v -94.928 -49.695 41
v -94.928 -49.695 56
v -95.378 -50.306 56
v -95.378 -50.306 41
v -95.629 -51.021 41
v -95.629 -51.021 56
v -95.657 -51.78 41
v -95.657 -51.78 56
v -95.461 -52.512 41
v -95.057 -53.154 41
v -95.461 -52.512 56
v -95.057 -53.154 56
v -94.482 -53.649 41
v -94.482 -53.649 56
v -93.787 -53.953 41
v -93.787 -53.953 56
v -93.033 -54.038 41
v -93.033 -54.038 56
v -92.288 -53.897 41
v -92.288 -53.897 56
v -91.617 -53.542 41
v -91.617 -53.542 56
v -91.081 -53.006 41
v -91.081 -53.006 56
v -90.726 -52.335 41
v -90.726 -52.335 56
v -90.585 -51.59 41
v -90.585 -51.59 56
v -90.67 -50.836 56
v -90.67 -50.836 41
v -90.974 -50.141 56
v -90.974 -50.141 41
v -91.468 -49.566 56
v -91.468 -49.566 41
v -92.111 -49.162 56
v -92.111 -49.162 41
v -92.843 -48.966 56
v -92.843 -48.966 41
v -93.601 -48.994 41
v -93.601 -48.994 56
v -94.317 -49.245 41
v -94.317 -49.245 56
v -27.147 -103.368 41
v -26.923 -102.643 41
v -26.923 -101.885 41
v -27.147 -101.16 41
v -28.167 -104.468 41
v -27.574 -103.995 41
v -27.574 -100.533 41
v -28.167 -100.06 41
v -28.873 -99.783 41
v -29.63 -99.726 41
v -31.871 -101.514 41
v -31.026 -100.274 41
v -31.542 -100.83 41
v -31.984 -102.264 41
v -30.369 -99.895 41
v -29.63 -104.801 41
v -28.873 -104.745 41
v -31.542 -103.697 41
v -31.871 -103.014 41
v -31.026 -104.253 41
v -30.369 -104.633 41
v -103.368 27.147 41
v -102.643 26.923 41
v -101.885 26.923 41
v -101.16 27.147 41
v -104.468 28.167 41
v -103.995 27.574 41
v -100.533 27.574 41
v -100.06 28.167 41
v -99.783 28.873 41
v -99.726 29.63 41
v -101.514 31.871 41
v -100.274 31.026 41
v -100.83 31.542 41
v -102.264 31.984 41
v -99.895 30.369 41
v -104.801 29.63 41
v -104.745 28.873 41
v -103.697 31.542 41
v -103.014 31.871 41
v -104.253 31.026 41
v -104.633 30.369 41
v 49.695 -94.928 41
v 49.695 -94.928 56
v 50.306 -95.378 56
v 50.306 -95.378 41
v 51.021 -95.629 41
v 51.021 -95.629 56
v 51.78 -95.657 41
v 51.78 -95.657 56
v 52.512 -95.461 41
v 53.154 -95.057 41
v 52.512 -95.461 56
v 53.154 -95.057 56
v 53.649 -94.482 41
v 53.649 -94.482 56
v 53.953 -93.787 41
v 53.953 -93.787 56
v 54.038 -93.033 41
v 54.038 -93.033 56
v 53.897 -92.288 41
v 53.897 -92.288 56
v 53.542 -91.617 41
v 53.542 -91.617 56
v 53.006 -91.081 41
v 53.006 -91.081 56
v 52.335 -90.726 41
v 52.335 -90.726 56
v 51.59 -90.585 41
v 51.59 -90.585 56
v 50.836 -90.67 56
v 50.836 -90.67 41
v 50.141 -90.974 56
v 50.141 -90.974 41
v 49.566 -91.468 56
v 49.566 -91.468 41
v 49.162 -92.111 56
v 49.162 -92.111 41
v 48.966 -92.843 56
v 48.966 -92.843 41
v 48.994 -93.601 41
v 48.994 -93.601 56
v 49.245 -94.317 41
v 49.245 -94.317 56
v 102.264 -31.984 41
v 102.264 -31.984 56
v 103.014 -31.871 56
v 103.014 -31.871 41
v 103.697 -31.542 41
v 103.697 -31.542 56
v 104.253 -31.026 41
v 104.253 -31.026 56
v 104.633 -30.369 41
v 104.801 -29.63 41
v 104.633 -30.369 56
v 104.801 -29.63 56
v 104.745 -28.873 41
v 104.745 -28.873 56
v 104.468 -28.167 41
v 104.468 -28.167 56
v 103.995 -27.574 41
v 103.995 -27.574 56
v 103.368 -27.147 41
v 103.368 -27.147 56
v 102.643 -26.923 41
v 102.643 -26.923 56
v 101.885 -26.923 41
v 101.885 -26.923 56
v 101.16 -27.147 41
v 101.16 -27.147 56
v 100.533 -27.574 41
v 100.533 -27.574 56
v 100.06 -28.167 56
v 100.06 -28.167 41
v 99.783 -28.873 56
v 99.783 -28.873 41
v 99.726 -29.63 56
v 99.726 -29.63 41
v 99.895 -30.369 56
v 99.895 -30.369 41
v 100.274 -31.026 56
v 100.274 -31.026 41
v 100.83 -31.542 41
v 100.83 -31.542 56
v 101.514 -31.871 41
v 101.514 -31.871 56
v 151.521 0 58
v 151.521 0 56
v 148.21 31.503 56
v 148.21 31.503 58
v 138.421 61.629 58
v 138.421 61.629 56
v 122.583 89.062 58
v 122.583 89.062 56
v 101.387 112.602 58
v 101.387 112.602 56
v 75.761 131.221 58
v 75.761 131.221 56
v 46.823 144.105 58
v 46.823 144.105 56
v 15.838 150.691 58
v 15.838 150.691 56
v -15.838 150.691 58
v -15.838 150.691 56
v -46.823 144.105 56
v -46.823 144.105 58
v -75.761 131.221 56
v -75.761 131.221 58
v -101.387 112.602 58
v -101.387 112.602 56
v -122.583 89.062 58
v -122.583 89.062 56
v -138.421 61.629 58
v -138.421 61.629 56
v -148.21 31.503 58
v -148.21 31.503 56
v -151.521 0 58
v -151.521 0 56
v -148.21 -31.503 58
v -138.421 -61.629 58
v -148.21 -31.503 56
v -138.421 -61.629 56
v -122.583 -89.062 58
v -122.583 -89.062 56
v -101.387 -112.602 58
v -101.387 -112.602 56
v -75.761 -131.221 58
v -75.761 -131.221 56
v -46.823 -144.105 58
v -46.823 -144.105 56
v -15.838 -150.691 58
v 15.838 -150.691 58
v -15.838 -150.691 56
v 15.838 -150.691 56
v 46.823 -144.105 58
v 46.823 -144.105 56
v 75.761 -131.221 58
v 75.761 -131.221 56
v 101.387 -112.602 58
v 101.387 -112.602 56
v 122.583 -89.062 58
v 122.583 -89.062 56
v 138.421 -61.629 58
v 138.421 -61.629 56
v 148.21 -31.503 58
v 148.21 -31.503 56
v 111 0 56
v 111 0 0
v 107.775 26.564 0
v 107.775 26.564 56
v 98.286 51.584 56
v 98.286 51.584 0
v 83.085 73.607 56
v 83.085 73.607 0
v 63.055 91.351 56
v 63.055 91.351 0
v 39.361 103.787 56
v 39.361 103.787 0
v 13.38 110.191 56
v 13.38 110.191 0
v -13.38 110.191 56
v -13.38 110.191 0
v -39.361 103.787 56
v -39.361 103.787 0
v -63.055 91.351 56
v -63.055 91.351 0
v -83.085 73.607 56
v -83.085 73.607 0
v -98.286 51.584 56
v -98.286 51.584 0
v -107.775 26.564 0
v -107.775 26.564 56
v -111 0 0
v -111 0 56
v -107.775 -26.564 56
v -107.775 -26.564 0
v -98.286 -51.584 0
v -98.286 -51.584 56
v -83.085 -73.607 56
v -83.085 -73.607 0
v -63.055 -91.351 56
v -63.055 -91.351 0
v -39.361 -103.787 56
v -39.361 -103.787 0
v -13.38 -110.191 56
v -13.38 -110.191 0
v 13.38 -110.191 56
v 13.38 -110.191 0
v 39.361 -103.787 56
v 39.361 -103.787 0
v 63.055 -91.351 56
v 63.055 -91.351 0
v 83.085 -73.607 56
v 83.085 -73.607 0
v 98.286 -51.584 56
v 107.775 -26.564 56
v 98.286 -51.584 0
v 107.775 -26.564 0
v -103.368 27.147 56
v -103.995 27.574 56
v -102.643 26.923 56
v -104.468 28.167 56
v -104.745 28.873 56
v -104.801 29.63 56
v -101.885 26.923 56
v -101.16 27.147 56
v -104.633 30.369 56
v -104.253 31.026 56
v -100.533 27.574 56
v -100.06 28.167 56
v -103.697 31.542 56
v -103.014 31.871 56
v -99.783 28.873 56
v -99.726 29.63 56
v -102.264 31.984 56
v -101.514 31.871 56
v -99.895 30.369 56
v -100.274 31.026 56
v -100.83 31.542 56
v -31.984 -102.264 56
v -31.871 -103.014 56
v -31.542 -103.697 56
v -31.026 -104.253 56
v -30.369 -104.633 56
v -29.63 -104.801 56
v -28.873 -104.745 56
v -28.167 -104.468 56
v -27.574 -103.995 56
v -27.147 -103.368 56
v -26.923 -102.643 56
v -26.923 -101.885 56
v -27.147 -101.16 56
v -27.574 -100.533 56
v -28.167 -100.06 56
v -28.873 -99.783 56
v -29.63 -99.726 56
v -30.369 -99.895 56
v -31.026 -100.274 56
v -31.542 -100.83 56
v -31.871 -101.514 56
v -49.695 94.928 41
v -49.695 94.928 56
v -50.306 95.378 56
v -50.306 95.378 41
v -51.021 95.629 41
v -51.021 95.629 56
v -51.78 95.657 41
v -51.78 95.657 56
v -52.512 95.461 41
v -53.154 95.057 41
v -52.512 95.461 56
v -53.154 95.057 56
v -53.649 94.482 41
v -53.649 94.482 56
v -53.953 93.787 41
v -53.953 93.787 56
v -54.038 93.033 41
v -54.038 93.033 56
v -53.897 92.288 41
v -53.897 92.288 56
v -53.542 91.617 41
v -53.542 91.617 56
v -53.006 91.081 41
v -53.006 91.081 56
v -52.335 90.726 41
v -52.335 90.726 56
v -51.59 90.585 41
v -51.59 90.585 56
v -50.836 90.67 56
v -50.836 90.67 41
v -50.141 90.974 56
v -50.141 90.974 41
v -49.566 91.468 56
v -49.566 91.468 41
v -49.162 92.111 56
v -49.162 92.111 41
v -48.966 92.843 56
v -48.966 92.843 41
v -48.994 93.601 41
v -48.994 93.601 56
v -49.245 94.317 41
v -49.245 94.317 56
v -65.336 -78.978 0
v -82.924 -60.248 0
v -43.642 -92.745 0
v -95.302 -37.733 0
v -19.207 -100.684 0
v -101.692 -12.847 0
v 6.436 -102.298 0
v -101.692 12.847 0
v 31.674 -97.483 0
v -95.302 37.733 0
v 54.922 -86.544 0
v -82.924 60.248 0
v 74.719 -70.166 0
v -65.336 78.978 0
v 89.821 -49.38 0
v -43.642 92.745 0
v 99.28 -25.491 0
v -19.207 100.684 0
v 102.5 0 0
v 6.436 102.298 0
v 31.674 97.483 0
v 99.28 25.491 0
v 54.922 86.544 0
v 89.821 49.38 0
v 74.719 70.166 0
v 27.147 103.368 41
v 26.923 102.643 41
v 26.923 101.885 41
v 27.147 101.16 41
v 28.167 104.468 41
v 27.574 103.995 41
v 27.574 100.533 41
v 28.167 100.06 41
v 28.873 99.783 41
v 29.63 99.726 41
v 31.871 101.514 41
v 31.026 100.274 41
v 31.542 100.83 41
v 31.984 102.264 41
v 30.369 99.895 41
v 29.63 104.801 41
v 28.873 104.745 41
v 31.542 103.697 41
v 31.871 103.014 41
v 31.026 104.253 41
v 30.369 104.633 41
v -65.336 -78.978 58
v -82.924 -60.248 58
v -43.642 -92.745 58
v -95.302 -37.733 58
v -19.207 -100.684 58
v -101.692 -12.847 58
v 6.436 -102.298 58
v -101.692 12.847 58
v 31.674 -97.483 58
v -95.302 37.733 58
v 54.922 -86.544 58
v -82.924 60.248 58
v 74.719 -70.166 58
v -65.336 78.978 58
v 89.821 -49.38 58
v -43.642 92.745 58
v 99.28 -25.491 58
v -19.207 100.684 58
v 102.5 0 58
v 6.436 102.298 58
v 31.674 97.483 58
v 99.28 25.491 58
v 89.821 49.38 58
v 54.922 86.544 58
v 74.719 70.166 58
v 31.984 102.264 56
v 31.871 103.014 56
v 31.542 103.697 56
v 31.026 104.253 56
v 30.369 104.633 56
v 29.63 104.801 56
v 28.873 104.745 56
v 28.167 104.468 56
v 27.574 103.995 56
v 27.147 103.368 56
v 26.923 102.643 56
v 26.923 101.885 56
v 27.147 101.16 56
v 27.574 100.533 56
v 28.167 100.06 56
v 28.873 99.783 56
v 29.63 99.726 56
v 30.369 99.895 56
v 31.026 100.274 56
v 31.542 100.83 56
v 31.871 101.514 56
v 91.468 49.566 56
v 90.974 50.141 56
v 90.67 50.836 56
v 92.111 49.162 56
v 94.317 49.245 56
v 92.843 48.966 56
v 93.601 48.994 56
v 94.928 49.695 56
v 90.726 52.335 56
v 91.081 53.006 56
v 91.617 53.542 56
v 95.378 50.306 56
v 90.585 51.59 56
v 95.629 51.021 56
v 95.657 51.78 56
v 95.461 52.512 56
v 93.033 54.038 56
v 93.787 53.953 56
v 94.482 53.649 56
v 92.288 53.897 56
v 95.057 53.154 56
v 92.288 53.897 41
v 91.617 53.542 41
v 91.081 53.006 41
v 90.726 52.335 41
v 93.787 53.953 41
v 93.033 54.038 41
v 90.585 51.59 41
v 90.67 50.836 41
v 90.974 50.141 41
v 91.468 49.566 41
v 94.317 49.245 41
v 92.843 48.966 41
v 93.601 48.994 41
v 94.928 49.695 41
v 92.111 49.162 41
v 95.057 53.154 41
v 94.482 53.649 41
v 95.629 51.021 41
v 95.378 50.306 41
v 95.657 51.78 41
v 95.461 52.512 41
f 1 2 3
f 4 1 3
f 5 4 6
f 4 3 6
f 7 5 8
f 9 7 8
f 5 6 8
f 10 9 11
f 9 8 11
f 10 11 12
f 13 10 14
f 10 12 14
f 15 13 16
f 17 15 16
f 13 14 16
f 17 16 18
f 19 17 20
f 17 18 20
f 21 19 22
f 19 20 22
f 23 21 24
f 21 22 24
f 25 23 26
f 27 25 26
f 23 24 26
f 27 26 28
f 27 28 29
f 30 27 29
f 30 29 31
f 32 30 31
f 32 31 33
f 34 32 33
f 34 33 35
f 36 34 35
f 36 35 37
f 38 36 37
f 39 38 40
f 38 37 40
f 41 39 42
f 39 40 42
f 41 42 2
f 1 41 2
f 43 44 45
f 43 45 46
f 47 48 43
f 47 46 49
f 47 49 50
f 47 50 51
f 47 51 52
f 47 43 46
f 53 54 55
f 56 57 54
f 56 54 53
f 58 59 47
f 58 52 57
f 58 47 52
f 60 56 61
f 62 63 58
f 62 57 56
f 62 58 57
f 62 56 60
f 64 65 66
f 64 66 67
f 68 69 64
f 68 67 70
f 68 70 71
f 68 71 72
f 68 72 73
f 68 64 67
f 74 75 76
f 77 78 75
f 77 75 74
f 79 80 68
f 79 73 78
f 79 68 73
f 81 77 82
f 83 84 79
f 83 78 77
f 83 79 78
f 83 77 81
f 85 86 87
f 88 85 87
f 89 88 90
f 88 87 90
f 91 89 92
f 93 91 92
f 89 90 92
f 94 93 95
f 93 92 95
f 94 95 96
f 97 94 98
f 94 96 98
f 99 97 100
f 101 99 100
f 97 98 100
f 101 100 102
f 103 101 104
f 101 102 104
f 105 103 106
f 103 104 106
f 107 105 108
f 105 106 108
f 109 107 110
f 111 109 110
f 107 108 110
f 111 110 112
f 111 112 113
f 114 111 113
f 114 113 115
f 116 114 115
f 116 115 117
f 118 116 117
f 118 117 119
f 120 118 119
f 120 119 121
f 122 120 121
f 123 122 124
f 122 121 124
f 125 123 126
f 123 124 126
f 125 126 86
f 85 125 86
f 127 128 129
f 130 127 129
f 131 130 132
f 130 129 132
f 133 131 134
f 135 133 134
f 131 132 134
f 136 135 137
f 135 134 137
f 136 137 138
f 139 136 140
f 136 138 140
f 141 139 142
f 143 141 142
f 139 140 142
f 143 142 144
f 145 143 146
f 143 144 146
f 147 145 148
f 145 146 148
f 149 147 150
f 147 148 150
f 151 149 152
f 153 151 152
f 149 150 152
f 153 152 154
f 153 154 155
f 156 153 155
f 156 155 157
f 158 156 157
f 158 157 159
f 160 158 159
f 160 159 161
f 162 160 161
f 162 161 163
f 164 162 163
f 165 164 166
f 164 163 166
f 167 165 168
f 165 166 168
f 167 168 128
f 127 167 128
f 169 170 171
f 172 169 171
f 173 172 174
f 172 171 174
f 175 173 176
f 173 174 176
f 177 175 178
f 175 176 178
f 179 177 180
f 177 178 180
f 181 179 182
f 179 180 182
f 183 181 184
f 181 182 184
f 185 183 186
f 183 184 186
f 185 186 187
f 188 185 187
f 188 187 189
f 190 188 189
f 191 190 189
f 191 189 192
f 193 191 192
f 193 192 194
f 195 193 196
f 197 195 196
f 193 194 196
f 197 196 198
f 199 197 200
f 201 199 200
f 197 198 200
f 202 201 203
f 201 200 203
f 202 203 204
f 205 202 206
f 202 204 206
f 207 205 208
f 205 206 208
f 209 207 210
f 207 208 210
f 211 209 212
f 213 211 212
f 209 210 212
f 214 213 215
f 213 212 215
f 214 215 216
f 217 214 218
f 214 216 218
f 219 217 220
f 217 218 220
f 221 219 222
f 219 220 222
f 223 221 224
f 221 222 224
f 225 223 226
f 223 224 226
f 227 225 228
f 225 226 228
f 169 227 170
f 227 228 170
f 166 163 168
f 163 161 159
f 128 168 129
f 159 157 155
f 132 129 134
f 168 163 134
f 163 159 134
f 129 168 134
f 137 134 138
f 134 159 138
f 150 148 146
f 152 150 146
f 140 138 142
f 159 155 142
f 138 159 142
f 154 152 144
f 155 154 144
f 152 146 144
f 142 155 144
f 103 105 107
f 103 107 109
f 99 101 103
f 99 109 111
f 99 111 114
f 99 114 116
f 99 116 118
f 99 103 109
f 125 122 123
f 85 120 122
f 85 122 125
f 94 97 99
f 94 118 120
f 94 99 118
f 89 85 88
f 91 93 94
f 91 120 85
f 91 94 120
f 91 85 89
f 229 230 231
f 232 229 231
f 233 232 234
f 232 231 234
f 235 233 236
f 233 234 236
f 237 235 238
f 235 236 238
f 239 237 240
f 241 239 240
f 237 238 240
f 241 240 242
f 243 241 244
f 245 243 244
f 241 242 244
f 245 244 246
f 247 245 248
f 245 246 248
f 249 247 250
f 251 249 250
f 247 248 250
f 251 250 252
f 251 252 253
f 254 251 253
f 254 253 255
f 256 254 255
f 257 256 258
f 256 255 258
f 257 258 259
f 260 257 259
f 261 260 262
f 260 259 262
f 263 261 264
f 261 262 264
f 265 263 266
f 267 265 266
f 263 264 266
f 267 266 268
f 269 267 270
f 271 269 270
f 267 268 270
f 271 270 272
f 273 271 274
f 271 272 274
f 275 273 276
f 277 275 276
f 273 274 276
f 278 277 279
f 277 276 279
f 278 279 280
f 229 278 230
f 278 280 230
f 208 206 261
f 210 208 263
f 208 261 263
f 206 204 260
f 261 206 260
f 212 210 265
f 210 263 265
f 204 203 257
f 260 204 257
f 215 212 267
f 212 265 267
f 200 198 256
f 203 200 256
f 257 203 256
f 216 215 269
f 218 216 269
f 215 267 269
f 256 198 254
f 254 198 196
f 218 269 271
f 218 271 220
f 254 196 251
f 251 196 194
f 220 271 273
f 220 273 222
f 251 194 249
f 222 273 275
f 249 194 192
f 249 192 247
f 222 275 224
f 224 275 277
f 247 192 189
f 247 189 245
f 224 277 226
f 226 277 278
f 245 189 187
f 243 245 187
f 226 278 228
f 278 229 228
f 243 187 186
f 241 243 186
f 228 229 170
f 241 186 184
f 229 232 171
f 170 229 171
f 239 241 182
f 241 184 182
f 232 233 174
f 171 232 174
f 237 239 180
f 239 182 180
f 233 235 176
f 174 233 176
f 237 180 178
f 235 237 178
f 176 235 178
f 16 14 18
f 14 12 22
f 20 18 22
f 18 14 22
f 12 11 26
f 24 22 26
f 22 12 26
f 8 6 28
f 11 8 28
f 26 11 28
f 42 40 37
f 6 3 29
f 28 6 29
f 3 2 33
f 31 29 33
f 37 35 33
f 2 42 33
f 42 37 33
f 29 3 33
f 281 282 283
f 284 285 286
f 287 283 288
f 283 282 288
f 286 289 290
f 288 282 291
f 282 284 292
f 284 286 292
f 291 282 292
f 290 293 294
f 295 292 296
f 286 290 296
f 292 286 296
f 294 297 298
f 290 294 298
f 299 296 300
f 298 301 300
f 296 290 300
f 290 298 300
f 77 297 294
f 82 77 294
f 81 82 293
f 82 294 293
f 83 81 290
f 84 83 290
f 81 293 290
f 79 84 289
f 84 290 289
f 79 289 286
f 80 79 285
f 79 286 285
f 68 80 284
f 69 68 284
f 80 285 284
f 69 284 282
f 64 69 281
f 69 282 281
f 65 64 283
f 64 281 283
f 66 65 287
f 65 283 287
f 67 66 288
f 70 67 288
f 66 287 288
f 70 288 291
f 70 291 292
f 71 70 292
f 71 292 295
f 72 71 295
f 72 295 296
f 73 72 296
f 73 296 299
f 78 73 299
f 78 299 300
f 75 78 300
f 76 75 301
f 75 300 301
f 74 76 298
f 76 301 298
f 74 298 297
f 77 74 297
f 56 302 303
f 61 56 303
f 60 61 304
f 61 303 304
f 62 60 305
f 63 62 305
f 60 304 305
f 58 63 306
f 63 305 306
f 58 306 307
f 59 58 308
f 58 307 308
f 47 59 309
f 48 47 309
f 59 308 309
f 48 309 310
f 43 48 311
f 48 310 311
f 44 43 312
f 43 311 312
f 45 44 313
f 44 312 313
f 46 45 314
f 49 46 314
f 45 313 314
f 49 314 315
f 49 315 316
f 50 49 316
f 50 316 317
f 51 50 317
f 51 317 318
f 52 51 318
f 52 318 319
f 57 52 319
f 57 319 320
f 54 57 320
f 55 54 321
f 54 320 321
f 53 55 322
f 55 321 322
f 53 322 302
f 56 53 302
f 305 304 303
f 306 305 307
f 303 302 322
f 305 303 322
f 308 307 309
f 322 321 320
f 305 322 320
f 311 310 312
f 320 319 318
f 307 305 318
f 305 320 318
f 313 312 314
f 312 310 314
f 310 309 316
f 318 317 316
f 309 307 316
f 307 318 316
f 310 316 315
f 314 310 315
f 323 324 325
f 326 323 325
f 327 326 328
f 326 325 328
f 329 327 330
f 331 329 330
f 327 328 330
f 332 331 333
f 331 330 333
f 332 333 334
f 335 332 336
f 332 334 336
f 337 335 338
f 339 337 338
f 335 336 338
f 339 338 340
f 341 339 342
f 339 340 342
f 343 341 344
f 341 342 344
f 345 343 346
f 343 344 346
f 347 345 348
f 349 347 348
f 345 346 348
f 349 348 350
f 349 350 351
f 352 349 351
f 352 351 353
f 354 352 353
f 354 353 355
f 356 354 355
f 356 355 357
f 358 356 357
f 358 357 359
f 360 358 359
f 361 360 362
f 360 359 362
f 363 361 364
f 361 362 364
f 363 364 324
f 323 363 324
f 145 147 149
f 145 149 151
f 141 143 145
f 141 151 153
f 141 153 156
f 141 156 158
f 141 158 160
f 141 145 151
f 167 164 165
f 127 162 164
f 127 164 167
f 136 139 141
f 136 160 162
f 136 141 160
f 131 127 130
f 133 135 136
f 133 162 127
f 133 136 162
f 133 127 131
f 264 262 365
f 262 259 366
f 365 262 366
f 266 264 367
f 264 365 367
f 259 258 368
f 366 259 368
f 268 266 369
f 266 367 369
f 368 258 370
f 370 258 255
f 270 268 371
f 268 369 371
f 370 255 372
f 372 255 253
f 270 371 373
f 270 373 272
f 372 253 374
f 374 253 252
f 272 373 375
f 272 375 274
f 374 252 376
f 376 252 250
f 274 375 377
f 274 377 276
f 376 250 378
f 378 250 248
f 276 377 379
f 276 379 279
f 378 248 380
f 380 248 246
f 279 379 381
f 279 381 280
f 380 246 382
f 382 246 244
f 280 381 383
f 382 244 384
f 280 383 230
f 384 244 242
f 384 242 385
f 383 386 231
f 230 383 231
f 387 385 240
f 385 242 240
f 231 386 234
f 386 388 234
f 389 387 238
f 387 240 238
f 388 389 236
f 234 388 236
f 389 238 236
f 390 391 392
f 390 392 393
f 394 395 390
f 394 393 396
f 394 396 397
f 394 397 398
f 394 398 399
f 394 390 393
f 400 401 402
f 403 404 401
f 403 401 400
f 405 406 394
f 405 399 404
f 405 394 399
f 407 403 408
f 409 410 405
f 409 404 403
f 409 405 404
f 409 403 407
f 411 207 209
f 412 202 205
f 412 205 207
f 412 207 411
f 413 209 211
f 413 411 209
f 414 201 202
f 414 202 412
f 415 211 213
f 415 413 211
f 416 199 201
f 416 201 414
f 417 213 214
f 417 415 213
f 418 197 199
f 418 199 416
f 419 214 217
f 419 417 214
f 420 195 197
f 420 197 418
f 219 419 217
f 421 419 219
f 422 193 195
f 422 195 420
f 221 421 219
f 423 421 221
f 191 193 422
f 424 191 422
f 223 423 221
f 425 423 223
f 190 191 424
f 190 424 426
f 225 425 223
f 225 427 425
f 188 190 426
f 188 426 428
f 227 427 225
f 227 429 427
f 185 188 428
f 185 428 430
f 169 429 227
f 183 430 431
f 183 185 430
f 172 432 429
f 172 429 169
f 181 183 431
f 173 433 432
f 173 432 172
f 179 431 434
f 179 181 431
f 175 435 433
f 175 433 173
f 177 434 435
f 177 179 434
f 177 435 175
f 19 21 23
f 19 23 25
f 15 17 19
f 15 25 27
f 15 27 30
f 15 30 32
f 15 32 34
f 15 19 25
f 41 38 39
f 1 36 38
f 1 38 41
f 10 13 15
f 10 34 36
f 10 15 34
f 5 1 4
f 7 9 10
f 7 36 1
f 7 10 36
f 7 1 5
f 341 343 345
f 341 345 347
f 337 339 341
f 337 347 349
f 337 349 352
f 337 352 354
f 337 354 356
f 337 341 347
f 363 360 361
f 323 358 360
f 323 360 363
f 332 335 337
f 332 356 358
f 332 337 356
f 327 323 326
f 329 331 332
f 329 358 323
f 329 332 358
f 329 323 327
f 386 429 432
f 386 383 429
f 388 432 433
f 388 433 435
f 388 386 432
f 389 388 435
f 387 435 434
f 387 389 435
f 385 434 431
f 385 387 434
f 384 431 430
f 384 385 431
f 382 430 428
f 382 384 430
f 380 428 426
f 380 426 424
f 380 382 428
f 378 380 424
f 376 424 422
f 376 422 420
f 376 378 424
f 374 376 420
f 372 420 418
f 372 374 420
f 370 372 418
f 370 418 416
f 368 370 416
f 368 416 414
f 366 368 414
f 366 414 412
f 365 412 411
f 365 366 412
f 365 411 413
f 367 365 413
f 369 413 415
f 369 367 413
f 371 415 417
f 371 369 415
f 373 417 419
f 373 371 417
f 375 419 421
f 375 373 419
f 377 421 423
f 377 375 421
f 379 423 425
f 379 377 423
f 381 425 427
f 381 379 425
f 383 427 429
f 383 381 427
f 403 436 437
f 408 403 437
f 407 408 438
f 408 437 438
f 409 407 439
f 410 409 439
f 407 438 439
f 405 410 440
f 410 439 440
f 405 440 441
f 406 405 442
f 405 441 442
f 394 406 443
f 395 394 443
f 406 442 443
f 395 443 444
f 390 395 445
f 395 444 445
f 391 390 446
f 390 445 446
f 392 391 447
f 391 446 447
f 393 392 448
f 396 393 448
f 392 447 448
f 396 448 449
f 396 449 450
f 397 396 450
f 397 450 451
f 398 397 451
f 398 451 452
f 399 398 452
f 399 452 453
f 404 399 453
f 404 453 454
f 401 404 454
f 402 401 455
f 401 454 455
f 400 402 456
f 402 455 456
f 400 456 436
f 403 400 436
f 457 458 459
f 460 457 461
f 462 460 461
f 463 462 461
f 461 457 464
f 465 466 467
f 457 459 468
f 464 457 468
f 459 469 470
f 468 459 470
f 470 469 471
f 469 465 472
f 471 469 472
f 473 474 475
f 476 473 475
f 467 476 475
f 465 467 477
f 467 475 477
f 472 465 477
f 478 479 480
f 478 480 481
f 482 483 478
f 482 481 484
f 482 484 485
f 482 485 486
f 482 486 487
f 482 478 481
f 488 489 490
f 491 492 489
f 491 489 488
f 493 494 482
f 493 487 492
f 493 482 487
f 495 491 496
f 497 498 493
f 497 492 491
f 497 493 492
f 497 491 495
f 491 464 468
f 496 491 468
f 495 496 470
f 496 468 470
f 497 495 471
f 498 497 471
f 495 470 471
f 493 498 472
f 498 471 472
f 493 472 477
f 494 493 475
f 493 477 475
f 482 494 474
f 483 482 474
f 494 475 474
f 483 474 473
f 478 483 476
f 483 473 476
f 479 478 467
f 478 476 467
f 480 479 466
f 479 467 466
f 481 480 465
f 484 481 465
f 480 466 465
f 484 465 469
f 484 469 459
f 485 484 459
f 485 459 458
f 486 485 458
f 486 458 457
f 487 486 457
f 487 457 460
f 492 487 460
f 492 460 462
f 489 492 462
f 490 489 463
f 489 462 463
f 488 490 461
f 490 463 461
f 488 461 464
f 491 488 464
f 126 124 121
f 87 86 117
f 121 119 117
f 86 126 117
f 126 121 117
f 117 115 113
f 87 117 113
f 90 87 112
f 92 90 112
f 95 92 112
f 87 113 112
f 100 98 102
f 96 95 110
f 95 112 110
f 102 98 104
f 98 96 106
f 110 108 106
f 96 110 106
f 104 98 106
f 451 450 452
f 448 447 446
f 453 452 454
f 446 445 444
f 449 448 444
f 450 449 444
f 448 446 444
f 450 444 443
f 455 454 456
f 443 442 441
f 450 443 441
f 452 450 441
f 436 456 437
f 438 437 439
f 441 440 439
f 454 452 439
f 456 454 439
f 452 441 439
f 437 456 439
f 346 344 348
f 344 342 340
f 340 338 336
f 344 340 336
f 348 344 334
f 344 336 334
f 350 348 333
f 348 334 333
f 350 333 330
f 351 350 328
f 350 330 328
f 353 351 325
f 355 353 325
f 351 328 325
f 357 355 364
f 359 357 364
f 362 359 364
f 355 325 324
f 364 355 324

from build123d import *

# Parameters (mm, degrees)
SKETCH1_R           = 111
SKETCH1_R_2         = 102.5
BOSS_EXTRUDE1_DEPTH = 56
SKETCH2_R           = 2.544731427
CUT_EXTRUDE1_DEPTH  = 15
CIRPATTERN1_COUNT   = 8
SKETCH3_R           = 151.521158387
SKETCH3_R_2         = 102.5
BOSS_EXTRUDE2_DEPTH = 2


with BuildPart() as part:
    # Sketch1 → Boss-Extrude1 (new body)
    with BuildSketch(Plane.XY):
        Circle(SKETCH1_R)
        Circle(SKETCH1_R_2, mode=Mode.SUBTRACT)
    extrude(amount=BOSS_EXTRUDE1_DEPTH)

    # Sketch2 → Cut-Extrude1 (cut)
    with BuildSketch(Plane.XY.offset(56)):
        with Locations((29.439514058, 102.263864137)):
            Circle(SKETCH2_R)
    cut_extrude1 = extrude(amount=-CUT_EXTRUDE1_DEPTH, mode=Mode.SUBTRACT)

    # CirPattern1: Cut-Extrude1 ×8 about axis
    cirpattern1_axis = Axis((0, 0, 0), (0, 0, 1))
    for i in range(1, CIRPATTERN1_COUNT):
        add(cut_extrude1.rotate(cirpattern1_axis, i * 360 / CIRPATTERN1_COUNT), mode=Mode.SUBTRACT)

    # Sketch3 → Boss-Extrude2 (add)
    with BuildSketch(Plane.XY.offset(56)):
        Circle(SKETCH3_R)
        Circle(SKETCH3_R_2, mode=Mode.SUBTRACT)
    extrude(amount=BOSS_EXTRUDE2_DEPTH)


solid = part.part
